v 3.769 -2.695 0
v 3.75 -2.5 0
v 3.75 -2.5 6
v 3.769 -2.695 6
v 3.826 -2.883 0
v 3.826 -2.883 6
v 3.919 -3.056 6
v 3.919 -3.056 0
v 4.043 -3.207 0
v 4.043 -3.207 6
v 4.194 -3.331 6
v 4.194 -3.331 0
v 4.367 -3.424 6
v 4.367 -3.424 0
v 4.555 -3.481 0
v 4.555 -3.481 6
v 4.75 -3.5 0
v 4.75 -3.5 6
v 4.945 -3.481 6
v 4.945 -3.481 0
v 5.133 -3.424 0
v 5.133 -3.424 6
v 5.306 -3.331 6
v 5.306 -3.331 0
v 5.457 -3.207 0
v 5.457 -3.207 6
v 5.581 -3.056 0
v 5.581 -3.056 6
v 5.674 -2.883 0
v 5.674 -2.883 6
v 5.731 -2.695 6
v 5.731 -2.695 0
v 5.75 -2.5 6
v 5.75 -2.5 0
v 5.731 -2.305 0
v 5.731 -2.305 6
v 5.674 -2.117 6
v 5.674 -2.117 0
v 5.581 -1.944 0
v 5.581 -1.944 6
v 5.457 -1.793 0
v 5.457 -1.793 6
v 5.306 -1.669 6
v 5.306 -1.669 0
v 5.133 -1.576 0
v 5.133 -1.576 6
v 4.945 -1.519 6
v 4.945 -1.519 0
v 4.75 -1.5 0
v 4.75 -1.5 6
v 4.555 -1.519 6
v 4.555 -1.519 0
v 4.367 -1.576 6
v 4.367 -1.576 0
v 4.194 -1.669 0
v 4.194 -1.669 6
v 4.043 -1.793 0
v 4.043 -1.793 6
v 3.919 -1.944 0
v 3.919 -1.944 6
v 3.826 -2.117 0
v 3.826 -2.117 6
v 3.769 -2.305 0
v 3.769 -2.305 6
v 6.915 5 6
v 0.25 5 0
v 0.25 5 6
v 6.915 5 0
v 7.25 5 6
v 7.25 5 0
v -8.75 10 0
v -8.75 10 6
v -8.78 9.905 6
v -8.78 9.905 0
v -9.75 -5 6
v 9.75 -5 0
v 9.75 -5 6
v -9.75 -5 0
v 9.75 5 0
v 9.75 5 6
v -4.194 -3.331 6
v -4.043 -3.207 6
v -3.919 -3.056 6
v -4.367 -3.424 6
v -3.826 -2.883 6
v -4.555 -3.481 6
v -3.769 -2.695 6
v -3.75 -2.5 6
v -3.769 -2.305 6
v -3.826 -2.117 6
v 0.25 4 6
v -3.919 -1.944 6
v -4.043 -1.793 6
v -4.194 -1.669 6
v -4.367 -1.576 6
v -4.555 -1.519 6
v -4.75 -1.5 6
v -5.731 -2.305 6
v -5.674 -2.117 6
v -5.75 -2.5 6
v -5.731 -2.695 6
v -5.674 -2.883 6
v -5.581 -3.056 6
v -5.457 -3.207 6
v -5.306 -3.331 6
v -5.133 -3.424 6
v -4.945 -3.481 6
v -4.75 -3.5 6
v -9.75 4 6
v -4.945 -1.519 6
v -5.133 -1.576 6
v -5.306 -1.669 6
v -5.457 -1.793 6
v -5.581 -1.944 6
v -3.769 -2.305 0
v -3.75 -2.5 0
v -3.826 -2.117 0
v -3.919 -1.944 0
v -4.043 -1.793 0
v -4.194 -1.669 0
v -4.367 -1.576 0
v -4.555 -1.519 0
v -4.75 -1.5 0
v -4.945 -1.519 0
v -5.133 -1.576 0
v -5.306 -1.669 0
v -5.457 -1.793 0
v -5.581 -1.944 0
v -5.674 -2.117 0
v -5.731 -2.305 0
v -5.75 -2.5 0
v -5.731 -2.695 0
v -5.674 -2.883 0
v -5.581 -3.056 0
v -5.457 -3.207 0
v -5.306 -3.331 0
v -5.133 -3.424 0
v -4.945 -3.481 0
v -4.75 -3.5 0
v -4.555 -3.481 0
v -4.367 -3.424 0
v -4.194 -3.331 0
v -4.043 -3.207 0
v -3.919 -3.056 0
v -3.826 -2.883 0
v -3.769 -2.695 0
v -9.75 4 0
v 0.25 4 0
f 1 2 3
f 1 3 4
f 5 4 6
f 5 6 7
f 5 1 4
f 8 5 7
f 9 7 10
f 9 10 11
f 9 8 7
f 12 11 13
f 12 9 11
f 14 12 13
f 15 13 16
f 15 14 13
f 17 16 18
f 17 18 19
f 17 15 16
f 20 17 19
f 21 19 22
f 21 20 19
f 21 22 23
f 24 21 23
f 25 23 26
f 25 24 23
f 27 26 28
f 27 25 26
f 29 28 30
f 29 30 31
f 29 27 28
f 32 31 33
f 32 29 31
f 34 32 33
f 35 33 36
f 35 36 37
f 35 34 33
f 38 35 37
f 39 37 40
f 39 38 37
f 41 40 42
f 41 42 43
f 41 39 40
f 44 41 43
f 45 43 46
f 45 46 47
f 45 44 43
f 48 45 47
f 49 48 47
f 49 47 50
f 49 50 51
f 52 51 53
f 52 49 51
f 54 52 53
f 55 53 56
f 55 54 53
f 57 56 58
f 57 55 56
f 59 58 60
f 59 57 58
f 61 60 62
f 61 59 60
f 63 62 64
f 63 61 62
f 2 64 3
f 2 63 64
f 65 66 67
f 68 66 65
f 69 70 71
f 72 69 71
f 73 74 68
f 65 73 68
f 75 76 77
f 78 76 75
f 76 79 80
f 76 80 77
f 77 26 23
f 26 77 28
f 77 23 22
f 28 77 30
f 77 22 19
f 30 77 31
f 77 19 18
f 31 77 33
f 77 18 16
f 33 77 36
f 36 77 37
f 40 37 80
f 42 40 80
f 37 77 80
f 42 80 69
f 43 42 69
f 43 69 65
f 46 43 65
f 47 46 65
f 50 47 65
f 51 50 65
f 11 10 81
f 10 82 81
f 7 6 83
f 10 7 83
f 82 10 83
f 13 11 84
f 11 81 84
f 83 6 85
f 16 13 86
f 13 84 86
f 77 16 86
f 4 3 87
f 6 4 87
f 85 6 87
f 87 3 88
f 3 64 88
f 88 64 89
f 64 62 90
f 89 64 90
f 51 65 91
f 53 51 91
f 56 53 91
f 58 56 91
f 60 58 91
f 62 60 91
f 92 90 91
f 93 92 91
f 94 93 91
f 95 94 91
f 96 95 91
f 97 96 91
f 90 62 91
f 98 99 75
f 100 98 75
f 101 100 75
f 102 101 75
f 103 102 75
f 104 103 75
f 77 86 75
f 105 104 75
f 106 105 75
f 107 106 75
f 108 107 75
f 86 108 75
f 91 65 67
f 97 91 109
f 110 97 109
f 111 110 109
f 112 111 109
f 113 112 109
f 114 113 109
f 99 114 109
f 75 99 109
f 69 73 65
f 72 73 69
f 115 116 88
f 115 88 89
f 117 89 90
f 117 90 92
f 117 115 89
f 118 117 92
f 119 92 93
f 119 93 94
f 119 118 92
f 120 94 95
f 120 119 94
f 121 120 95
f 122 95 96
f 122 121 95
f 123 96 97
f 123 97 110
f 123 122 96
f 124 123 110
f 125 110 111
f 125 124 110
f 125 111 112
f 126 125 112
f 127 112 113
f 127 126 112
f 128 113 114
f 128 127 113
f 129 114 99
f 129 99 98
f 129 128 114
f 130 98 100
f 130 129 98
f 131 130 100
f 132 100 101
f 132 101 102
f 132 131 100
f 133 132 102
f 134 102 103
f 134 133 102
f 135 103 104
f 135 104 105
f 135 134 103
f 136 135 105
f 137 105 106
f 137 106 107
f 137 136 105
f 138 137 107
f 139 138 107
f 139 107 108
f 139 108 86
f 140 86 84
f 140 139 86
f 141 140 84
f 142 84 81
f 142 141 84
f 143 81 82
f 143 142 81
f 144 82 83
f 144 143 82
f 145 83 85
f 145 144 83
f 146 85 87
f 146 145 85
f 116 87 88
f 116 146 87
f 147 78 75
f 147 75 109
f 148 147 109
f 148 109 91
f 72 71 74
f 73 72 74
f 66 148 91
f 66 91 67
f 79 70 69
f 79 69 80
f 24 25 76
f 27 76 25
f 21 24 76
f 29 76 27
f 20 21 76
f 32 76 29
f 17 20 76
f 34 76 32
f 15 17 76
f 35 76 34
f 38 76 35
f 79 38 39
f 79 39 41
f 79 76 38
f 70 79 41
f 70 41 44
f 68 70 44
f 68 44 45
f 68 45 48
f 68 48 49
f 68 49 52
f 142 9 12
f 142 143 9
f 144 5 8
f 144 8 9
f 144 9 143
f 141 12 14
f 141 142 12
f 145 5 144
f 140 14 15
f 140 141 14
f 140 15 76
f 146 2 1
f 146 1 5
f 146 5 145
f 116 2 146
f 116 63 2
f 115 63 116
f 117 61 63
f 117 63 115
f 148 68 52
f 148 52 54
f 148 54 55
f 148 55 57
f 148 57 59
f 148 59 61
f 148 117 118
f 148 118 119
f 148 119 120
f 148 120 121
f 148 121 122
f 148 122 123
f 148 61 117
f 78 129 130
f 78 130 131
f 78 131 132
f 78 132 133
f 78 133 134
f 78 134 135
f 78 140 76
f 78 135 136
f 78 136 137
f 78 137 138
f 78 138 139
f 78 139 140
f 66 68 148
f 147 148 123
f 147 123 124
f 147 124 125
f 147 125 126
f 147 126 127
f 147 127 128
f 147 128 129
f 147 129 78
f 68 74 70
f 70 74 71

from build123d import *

# Parameters (mm, degrees)
SKETCH1_R           = 1
BOSS_EXTRUDE1_DEPTH = 6
BOSS_EXTRUDE2_DEPTH = 6


with BuildPart() as part:
    # Sketch1 → Boss-Extrude1 (new body)
    with BuildSketch(Plane.XY):
        Polygon((-9.75, 4), (0.25, 4), (0.25, 5), (9.75, 5), (9.75, -5), (-9.75, -5), align=None)
        with Locations((-4.75, -2.5)):
            Circle(SKETCH1_R, mode=Mode.SUBTRACT)
        with Locations(Location((4.75, -2.5, 0), (0, 0, 180))):
            Circle(SKETCH1_R, mode=Mode.SUBTRACT)
    extrude(amount=BOSS_EXTRUDE1_DEPTH)

    # Sketch2 → Boss-Extrude2 (add)
    with BuildSketch(Plane(origin=(0, 0, 0), x_dir=(-1, 0, 0), z_dir=(0, 0, -1))):
        Polygon((-7.25, 5), (8.75, 10), (8.779827499, 9.904552002), (-6.914738908, 5), align=None)
    extrude(amount=-BOSS_EXTRUDE2_DEPTH)


solid = part.part
